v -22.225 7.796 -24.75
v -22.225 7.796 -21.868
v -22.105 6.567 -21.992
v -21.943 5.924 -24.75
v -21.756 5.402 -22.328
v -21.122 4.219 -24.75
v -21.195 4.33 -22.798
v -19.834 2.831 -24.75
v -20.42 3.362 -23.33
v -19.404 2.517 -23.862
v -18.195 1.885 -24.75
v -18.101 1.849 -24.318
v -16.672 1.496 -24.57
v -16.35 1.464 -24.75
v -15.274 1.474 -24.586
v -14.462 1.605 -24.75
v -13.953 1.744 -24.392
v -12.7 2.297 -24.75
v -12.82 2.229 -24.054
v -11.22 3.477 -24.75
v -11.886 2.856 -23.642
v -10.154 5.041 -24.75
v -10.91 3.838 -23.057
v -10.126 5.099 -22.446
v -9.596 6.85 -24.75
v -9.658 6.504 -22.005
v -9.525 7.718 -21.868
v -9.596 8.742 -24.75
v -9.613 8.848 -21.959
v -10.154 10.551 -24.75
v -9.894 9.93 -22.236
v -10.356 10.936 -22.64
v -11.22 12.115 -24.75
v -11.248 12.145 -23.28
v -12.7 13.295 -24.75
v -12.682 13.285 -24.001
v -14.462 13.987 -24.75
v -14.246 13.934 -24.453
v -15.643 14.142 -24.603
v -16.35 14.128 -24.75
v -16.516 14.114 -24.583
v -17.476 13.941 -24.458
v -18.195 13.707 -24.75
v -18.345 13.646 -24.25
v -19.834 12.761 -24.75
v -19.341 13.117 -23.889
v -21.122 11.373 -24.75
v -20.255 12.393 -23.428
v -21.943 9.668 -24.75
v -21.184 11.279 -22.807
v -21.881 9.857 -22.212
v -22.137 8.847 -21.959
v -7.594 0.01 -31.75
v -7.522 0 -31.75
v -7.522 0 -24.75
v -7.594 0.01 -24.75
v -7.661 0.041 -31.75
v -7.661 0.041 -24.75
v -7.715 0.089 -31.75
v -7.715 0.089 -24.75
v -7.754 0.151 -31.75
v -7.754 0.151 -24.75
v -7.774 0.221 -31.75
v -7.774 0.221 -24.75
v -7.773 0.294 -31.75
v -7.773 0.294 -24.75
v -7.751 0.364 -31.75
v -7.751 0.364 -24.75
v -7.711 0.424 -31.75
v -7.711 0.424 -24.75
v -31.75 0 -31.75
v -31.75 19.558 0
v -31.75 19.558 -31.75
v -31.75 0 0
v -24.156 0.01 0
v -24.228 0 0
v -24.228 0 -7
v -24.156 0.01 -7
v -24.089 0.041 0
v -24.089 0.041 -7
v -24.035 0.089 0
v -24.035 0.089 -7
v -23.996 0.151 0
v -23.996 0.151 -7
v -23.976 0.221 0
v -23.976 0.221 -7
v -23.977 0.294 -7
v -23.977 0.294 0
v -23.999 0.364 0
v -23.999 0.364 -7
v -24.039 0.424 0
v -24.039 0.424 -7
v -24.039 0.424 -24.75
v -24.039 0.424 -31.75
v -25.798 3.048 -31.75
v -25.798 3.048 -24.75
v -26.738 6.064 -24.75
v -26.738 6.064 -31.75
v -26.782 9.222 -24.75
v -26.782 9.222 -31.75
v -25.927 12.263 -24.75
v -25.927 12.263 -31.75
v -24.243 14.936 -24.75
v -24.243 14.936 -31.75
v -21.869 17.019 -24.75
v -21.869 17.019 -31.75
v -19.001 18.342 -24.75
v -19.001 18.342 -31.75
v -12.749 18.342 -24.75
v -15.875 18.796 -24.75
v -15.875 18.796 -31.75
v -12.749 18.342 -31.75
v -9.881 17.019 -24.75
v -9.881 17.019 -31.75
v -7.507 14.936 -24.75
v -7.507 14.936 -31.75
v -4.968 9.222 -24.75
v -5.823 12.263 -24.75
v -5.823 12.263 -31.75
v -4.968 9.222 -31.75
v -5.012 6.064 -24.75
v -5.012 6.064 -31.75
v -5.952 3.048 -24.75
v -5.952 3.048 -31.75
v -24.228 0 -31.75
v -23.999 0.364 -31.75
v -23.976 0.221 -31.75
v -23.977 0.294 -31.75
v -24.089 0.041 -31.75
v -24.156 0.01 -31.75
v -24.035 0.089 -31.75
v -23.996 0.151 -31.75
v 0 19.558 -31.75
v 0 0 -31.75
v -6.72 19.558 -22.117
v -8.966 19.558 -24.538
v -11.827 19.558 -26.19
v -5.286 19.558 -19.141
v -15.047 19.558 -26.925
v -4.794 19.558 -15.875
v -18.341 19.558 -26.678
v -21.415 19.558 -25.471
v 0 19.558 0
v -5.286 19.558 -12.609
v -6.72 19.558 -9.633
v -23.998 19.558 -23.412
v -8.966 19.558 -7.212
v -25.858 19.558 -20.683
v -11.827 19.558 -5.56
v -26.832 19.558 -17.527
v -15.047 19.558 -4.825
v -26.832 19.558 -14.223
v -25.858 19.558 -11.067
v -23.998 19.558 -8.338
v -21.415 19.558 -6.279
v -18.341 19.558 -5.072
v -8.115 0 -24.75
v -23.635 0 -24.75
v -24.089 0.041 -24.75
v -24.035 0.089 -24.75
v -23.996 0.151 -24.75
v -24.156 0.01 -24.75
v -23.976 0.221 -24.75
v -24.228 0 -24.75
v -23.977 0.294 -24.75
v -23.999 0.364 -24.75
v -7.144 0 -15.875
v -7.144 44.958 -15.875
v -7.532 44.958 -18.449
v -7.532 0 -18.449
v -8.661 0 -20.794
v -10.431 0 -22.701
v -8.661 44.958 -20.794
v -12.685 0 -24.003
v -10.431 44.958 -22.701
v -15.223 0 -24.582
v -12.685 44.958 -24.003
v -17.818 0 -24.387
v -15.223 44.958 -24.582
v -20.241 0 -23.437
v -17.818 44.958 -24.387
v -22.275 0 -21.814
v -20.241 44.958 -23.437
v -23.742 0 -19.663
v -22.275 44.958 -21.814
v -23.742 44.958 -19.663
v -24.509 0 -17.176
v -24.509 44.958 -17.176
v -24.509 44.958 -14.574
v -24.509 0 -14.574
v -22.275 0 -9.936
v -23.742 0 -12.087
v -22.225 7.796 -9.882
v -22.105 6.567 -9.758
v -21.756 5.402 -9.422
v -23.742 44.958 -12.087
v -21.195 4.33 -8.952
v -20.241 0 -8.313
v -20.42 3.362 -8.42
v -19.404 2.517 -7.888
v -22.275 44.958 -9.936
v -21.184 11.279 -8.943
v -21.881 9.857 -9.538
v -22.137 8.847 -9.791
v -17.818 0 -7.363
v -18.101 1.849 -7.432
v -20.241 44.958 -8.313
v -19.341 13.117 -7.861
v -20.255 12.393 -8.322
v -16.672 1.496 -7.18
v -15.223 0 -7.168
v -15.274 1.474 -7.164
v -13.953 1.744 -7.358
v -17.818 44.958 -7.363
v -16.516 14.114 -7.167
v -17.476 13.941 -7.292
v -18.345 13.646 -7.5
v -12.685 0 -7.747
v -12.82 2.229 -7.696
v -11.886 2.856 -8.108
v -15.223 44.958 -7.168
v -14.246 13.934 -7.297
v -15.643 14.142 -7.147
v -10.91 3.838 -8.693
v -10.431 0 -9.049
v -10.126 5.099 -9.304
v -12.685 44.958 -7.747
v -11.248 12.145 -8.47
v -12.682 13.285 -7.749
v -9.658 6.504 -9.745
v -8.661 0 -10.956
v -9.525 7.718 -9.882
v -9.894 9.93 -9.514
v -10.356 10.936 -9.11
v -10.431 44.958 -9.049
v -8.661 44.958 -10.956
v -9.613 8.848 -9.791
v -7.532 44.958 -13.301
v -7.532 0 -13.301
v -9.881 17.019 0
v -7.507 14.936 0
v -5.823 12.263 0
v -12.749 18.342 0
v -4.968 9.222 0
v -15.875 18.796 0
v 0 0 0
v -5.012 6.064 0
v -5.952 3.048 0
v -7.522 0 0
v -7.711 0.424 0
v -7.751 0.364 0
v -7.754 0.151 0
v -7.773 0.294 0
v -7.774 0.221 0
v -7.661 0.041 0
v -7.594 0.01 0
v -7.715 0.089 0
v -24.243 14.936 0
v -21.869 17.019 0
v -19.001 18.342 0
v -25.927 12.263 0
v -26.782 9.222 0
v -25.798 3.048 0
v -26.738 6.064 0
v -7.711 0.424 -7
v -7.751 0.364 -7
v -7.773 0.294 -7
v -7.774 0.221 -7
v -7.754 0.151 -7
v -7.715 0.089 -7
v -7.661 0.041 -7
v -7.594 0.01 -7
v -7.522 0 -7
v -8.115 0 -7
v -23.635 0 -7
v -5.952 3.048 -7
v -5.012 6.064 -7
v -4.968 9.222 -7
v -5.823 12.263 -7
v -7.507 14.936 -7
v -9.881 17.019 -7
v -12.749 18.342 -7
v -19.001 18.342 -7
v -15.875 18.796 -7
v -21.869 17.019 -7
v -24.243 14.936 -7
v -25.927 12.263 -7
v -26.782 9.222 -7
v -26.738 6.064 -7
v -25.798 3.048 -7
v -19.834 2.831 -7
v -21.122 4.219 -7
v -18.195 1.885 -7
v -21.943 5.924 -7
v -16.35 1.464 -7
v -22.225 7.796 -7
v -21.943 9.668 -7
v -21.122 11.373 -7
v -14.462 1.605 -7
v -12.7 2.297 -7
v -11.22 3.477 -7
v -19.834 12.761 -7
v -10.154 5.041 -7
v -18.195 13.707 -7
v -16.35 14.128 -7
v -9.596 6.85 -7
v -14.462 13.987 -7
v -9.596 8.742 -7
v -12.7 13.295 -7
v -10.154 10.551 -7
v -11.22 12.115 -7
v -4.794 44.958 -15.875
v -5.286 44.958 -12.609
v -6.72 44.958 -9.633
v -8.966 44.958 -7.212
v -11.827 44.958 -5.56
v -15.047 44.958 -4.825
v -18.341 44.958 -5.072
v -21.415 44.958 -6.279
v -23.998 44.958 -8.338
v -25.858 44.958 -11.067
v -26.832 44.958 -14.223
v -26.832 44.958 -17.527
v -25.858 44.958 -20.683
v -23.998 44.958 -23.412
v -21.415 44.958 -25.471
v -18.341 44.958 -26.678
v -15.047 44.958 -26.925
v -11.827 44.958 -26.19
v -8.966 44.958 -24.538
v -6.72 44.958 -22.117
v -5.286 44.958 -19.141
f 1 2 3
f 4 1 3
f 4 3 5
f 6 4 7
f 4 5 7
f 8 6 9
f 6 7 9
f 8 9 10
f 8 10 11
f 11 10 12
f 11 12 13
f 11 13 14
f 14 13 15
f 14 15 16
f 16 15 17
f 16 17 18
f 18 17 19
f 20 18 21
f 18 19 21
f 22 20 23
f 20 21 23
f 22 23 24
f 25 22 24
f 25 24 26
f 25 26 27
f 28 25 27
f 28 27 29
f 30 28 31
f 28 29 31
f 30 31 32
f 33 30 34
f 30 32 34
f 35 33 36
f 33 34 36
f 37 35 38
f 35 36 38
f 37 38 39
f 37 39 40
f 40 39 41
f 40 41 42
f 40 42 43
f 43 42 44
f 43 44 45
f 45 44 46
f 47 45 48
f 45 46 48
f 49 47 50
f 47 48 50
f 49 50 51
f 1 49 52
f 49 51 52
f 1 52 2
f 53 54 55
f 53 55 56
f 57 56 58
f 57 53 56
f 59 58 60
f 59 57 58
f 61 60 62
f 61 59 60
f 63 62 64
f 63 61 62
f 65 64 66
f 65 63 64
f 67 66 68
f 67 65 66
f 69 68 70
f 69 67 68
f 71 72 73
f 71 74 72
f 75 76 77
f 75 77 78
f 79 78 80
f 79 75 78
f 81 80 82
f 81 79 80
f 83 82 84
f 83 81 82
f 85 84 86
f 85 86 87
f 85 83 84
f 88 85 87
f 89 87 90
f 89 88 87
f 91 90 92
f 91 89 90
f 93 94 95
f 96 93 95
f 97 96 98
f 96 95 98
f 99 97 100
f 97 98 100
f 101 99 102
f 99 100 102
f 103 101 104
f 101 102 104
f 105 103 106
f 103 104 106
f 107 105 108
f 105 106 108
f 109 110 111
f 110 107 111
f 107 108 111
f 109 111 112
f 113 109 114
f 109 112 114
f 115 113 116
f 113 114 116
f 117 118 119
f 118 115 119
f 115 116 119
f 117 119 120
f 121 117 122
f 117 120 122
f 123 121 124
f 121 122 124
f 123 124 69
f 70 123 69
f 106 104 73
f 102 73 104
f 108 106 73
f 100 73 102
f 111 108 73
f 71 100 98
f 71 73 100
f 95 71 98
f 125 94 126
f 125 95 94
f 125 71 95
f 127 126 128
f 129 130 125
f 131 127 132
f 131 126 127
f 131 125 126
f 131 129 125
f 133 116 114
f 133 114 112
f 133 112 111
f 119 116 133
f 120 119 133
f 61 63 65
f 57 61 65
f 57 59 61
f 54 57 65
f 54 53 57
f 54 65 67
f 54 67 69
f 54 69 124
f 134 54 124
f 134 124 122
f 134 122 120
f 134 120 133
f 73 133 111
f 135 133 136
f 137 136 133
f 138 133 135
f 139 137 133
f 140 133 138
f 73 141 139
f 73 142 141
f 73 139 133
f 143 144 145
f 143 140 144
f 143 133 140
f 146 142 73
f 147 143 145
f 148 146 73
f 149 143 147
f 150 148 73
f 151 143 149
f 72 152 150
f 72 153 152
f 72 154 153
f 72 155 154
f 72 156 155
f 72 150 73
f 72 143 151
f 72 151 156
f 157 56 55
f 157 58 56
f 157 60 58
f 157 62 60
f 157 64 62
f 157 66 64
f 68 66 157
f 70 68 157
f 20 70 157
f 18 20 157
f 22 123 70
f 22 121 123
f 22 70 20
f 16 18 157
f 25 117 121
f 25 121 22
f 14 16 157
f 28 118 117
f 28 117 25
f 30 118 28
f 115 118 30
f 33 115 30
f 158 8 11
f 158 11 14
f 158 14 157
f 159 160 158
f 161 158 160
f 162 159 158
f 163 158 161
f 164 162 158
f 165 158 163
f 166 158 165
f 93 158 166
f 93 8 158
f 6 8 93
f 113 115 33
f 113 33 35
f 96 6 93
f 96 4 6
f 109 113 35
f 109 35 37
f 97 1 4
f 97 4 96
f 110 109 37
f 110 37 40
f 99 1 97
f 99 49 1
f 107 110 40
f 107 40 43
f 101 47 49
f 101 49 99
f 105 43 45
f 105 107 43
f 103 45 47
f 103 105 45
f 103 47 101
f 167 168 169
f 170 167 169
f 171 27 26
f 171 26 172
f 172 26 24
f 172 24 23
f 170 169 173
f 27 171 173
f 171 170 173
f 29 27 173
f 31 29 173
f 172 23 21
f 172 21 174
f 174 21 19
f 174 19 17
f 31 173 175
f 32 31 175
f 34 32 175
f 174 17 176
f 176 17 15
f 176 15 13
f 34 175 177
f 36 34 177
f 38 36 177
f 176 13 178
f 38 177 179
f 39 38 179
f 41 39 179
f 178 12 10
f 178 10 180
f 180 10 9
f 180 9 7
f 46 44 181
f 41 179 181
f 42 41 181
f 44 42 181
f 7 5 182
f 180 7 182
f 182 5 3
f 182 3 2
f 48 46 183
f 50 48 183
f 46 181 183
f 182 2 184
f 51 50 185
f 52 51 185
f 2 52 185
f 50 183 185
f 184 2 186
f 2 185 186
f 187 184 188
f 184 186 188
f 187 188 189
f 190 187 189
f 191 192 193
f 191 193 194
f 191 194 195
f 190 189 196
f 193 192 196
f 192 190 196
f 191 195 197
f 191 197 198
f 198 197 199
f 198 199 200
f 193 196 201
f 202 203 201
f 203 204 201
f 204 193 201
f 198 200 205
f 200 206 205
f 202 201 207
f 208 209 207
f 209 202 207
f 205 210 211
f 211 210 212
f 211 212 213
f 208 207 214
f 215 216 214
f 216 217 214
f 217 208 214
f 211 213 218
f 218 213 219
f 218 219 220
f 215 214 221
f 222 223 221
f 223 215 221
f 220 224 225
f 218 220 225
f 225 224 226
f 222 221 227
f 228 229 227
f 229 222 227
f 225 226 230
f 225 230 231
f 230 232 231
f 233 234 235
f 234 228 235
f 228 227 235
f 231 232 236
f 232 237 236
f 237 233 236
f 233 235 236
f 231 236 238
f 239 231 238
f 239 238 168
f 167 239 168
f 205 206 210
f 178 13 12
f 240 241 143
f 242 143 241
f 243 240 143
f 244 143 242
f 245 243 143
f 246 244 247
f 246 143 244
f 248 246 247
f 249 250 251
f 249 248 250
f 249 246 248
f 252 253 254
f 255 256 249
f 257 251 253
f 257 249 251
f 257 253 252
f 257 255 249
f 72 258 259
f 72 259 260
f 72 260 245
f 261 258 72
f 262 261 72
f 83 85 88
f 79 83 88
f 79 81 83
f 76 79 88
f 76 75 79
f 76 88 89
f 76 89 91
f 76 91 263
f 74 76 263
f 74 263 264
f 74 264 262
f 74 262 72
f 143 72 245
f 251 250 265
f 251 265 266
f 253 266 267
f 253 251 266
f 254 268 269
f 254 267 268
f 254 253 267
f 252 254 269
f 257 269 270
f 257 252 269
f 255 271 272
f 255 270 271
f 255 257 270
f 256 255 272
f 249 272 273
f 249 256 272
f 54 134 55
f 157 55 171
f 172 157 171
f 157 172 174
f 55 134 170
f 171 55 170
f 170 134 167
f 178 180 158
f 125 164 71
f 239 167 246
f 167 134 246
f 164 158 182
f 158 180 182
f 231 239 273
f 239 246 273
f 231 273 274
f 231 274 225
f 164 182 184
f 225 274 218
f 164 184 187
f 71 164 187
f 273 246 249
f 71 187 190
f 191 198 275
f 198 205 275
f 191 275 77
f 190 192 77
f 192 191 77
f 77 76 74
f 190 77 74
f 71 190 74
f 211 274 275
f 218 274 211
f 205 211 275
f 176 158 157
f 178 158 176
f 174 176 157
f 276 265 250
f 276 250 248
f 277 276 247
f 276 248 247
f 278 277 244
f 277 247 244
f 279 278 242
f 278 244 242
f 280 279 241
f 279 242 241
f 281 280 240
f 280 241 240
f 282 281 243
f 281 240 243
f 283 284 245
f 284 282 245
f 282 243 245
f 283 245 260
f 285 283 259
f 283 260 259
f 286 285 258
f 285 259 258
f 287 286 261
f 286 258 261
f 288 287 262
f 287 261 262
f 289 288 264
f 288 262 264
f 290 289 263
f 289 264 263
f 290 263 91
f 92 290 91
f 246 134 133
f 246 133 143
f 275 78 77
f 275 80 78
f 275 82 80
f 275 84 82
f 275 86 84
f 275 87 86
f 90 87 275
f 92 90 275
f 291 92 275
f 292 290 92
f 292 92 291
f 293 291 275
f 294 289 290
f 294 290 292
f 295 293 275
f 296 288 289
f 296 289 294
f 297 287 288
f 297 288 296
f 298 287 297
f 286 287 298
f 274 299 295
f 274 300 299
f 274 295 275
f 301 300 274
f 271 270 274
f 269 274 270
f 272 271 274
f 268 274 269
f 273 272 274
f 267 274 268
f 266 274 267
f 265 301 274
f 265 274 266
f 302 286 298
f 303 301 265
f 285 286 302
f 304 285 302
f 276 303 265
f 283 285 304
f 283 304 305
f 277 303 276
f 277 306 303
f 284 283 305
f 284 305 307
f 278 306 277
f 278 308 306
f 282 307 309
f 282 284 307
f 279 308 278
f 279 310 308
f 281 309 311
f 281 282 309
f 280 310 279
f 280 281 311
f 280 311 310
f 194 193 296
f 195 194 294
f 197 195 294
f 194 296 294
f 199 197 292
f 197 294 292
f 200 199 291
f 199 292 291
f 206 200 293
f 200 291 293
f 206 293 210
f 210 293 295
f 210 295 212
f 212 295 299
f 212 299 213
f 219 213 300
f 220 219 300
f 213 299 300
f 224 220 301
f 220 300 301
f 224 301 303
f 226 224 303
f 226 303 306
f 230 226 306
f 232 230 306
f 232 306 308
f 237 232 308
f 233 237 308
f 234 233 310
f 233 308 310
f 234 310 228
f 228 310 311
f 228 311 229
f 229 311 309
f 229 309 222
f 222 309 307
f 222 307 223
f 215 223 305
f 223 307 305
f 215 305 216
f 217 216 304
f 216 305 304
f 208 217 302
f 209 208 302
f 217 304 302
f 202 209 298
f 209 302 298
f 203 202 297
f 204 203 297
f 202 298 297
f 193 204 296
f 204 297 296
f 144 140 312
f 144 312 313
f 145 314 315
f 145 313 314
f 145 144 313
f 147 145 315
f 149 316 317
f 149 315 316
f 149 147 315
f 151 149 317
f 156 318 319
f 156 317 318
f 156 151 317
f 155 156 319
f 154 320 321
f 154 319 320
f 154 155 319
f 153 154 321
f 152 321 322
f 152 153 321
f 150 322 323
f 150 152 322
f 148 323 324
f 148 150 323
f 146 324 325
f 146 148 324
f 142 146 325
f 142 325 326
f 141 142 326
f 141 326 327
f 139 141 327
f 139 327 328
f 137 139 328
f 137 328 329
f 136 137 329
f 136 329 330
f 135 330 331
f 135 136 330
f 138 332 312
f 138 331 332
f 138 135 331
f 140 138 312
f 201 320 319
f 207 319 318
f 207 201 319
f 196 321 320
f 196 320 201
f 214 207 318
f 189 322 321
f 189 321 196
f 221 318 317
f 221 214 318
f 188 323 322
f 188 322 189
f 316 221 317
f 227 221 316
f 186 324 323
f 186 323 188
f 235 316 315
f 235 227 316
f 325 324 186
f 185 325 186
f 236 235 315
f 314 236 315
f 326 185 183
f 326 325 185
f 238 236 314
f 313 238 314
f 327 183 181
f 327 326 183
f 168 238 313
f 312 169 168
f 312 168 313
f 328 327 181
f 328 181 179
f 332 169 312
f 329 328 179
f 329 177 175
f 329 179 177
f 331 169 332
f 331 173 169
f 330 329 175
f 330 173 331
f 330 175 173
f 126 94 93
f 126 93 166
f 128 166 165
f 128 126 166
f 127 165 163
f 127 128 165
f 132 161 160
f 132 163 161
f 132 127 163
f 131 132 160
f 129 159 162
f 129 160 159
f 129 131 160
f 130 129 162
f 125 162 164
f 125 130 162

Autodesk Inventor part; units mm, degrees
ref_plane "YZ Plane" through (0, 0, 0) normal (1, 0, 0) x (0, 1, 0)
ref_plane "XZ Plane" through (0, 0, 0) normal (0, 1, 0) x (-1, 0, 0)
ref_plane "XY Plane" through (0, 0, 0) normal (0, 0, 1) x (1, 0, 0)
sketch "Sketch1" plane through (0, 0, 0) normal (0, 1, 0) x (-1, 0, 0)
  line L0 (0, 0) -> (31.75, 0)
  line L1 (31.75, 0) -> (31.75, -31.75)
  line L2 (31.75, -31.75) -> (0, -31.75)
  line L3 (0, -31.75) -> (0, 0)
  dimension "d0" = 31.75
  dimension "d1" = 31.75
extrude "Extrusion1" add sketch "Sketch1" along normal blind 19.558
sketch "Sketch2" plane through (0, 19.558, 0) normal (0, 1, 0) x (1, 0, 0)
  line L0 (-31.75, 31.75) -> (-31.75, 0) construction
  line L1 (-31.75, 0) -> (0, 31.75) construction
  circle A0 centre (-15.875, 15.875) radius 11.0808
  point P0 (0, 0)
  dimension "d4" = 22.1615
extrude "Extrusion2" add sketch "Sketch2" along normal blind 25.4
sketch "Sketch3" plane through (-15.875, 44.958, -15.875) normal (0, 1, 0) x (1, 0, 0)
  circle A0 centre (0, 0) radius 8.7313
  circle A1 centre (0, 0) radius 11.0808 projected
  point P0 (15.875, -15.875)
  dimension "d19" = 17.4625
extrude "Extrusion3" cut sketch "Sketch3" against normal through all contours A0
sketch "Sketch4" plane through (-31.75, 0, 0) normal (0, 0, 1) x (1, 0, 0)
  circle A0 centre (15.875, 7.796) radius 11
  line L0 (0, 19.558) -> (31.75, 19.558) construction
  line L1 (15.875, 19.558) -> (15.875, 0) construction
  line L2 (31.75, 0) -> (0, 0) construction
  dimension "d10" = 22
  dimension "d20" = 11.762
extrude "Extrusion4" cut sketch "Sketch4" against normal blind 7
sketch "Sketch5" plane through (0, 0, -31.75) normal (0, 0, -1) x (-1, 0, 0)
  circle A0 centre (15.875, 7.796) radius 11 projected
  point P0 (0, 0)
extrude "Extrusion5" cut sketch "Sketch5" against normal blind 7
sketch "Sketch6" plane through (-15.875, 7.796, -7) normal (0, 0, 1) x (-1, 0, 0)
  circle A0 centre (0, 0) radius 6.35
  point P0 (-15.875, 7.796)
  dimension "d15" = 12.7
extrude "Extrusion6" cut sketch "Sketch6" against normal through all
fillet "Fillet1" radius 0.254 4 edges at (-8.1147, 0, -3.5) (-23.6353, 0, -3.5) (-23.6353, 0, -28.25) (-8.1147, 0, -28.25)
properties part number "bearingholder" material "Aluminum 6061"
